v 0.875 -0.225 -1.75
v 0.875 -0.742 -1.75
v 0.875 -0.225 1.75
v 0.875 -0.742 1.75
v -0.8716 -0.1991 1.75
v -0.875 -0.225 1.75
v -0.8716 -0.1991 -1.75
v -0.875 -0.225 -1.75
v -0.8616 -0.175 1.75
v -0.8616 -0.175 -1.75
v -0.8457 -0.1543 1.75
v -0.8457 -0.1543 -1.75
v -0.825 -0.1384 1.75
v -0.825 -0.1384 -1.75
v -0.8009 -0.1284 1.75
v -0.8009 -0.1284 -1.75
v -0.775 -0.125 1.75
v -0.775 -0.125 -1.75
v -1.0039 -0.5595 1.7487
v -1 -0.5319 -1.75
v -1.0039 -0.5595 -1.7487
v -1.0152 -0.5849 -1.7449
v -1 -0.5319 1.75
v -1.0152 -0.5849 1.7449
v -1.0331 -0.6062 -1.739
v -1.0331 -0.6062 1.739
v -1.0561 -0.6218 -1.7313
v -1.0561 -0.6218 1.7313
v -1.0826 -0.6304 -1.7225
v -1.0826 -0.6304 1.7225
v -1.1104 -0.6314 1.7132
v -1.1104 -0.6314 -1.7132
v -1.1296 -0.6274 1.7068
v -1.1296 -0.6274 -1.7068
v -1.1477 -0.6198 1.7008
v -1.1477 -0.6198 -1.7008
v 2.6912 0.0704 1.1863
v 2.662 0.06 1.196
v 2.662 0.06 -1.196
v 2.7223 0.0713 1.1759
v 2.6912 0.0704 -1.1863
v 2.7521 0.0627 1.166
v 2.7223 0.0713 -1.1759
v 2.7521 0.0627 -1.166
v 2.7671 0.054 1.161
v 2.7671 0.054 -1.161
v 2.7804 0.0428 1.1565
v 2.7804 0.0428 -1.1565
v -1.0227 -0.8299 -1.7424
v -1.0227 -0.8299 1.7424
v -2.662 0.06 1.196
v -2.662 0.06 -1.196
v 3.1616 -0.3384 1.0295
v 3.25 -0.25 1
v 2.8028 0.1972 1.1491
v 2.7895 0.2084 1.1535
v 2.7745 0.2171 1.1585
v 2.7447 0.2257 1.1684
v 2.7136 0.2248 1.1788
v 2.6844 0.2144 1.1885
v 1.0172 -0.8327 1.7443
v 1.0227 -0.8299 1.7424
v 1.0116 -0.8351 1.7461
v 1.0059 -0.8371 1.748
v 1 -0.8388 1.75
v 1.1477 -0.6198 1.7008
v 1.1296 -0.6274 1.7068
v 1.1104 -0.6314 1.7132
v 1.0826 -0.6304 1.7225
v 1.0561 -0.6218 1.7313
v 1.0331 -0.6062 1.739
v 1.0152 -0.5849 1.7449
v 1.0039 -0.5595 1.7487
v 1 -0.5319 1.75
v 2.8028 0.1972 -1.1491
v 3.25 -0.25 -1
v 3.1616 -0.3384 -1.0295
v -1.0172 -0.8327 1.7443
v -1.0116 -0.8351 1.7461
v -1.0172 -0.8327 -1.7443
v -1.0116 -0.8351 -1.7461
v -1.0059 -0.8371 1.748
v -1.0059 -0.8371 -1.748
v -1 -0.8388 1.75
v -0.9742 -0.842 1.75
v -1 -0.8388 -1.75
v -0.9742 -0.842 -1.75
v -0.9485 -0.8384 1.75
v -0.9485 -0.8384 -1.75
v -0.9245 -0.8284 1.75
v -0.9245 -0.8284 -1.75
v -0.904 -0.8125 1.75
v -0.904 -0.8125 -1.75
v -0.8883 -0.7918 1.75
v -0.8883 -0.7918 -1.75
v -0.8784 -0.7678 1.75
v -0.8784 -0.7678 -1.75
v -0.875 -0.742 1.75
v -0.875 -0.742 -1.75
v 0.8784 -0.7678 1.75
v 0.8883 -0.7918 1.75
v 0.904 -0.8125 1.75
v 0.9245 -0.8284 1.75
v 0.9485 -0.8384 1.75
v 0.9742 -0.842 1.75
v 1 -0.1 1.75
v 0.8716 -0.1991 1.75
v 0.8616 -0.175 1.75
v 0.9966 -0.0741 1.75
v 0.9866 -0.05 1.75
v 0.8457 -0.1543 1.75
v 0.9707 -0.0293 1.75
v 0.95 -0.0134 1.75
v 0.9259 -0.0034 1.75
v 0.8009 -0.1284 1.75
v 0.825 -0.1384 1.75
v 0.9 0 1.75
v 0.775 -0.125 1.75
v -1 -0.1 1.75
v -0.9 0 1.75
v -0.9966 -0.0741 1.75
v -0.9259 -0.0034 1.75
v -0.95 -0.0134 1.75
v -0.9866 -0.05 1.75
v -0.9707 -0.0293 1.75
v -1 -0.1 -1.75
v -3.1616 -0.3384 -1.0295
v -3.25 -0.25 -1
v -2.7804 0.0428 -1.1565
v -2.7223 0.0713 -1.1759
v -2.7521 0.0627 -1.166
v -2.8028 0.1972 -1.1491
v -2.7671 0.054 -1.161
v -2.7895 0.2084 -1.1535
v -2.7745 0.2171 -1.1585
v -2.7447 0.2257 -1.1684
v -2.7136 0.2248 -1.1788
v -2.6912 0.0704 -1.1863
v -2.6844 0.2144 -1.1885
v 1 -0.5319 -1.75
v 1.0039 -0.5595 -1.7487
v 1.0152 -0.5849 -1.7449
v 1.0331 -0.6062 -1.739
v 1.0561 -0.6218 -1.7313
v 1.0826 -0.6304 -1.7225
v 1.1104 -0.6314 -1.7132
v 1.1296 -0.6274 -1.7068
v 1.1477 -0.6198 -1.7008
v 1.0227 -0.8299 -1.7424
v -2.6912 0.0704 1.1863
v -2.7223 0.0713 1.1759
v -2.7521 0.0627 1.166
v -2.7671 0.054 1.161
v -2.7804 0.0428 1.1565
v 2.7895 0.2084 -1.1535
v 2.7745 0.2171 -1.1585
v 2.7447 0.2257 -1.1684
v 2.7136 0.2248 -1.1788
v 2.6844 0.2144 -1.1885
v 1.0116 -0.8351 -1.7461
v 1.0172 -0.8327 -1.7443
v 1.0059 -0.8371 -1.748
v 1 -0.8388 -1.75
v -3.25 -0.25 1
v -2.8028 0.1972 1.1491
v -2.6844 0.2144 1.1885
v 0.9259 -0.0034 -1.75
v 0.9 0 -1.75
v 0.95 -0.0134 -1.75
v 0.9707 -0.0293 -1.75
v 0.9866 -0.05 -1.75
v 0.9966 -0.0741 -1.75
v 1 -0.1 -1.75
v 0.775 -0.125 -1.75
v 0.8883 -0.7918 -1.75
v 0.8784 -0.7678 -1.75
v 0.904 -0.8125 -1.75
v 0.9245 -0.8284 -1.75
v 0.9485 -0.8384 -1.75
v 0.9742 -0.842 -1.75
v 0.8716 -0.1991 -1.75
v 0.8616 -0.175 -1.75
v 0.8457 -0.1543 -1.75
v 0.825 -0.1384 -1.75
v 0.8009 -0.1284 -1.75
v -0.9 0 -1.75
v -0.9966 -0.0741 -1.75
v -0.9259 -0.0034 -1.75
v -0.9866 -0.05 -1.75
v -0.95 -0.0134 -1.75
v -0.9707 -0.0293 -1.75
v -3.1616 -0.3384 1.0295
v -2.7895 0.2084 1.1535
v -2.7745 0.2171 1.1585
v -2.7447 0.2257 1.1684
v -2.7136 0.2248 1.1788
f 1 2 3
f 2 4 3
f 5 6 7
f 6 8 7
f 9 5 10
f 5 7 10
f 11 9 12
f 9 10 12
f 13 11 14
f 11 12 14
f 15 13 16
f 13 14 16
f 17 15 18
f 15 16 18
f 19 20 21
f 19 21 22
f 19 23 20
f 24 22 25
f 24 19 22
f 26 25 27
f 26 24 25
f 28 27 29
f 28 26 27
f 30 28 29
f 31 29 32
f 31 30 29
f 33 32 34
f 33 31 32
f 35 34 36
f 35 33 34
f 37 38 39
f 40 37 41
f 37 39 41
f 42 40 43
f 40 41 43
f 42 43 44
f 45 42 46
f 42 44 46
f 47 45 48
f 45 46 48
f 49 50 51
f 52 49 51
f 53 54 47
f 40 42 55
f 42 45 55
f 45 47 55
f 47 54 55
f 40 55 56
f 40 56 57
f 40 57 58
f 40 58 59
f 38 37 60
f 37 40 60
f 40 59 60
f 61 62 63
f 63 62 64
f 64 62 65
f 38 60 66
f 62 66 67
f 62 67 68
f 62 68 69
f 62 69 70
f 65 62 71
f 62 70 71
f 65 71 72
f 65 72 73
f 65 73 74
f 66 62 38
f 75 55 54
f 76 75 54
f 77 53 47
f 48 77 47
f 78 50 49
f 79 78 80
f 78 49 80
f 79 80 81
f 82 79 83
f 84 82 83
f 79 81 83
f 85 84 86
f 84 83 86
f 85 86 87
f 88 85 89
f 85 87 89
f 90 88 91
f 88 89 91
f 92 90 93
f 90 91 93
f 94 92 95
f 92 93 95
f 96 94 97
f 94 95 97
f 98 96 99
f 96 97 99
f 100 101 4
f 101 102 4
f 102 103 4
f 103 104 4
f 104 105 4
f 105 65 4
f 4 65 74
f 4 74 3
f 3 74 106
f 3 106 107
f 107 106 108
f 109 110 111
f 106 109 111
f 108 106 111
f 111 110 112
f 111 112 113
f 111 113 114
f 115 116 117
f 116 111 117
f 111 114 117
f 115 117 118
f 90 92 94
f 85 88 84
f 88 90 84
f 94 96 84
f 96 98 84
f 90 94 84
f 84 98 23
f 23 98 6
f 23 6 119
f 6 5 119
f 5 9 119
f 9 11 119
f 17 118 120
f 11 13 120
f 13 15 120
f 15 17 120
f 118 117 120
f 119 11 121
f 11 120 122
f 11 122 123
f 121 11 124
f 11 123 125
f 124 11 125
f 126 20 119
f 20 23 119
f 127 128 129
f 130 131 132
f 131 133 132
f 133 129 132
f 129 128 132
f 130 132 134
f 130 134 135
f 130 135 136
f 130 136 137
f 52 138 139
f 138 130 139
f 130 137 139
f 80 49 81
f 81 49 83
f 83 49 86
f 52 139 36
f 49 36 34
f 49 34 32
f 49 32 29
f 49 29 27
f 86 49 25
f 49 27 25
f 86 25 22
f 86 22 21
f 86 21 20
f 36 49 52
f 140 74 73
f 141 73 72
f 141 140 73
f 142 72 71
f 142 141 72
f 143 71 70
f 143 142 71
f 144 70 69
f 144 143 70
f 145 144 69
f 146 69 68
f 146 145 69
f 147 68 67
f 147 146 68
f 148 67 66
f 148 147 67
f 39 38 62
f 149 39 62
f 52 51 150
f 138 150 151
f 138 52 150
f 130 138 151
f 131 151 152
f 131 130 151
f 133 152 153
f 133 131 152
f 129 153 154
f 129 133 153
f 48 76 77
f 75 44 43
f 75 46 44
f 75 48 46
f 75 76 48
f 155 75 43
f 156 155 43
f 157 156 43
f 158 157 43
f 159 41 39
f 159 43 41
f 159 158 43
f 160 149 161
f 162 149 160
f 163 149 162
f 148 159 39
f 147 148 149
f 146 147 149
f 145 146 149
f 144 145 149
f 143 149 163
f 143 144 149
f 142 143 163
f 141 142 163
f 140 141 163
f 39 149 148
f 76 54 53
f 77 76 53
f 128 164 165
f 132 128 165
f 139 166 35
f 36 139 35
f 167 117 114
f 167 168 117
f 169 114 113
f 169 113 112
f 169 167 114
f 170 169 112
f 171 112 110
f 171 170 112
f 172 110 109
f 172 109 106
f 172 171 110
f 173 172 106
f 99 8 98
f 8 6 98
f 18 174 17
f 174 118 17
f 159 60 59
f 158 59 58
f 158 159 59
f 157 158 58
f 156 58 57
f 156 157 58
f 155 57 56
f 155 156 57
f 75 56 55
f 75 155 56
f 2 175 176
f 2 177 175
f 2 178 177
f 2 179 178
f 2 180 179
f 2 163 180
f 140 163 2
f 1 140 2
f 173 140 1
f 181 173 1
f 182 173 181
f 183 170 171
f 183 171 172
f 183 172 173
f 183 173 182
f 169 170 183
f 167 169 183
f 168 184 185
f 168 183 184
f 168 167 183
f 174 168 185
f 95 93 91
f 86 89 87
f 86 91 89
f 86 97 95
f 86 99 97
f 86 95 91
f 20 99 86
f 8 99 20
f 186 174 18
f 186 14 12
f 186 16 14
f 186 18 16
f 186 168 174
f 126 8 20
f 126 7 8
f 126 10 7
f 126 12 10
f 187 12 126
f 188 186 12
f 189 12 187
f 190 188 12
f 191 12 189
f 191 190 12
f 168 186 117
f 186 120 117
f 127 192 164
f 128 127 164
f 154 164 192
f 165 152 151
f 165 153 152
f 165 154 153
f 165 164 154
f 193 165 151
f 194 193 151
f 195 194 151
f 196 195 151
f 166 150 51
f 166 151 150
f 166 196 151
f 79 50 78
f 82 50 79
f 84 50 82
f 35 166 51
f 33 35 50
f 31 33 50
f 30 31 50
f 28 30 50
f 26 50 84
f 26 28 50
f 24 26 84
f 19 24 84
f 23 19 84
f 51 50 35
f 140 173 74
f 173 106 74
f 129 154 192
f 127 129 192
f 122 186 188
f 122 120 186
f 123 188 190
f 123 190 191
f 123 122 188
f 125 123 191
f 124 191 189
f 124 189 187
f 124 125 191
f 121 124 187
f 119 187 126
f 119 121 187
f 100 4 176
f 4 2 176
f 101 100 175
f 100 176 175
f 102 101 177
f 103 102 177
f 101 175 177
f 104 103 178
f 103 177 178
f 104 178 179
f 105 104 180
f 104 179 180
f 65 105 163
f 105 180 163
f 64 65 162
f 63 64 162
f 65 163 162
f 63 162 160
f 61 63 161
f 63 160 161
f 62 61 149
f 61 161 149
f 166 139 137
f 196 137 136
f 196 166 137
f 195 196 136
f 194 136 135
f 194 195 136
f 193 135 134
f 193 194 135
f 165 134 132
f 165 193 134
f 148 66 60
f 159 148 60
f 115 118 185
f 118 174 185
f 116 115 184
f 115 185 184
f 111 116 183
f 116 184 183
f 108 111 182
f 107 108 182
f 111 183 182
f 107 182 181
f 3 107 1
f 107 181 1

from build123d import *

# Parameters (mm, degrees)
BOSS_EXTRUDE1_DEPTH  = 1.75
CUT_EXTRUDE1_DEPTH   = 4.801744338
MIRROR2_COPY_1_DEPTH = 4.801744338
FILLET1_R            = 0.1


with BuildPart() as part:
    # Sketch1 → Boss-Extrude1 (new, symmetric)
    with BuildSketch(Plane.XY):
        Polygon((-1, 0), (1, 0), (1, -0.7), (2.75, 0.25), (3.25, -0.25), (3.161611652, -0.338388348), (2.727609122, 0.095614182), (0.875, -0.910087913), (0.875, -0.125), (-0.875, -0.125), (-0.875, -0.910087913), (-2.727609122, 0.095614182), (-3.161611652, -0.338388348), (-3.25, -0.25), (-2.75, 0.25), (-1, -0.7), align=None)
    extrude(amount=BOSS_EXTRUDE1_DEPTH, both=True)

    # Sketch2 → Cut-Extrude1 (cut, symmetric)
    with BuildSketch(Plane(origin=(0, 0, 0), x_dir=(1, 0, 0), z_dir=(0, 1, 0))):
        Polygon((-3.25, 1), (-1, 1.75), (-3.25, 1.75), align=None)
    cut_extrude1 = extrude(amount=CUT_EXTRUDE1_DEPTH, both=True, mode=Mode.SUBTRACT)

    # Mirror1: Cut-Extrude1 across plane
    add(cut_extrude1.mirror(Plane.XY), mode=Mode.SUBTRACT)

    # Mirror2: Cut-Extrude1 across plane
    add(cut_extrude1.mirror(Plane(origin=(0, 0, 0), x_dir=(0, 0, 1), z_dir=(1, 0, 0))), mode=Mode.SUBTRACT)

    # Mirror2 copy 1 sketch → Mirror2 copy 1 (cut, symmetric)
    with BuildSketch(Plane(origin=(0, 0, 0), x_dir=(-1, 0, 0), z_dir=(0, 1, 0))):
        Polygon((-3.25, 1), (-1, 1.75), (-3.25, 1.75), align=None)
    extrude(amount=MIRROR2_COPY_1_DEPTH, both=True, mode=Mode.SUBTRACT)

    # Fillet1
    fillet1_edges = [part.edges().sort_by_distance(p)[0] for p in [
        (1, 0, 0),
        (-1, 0, 0),
        (0.875, -0.125, 0),
        (-0.875, -0.125, 0),
        (0.875, -0.910087913, 0),
        (-0.875, -0.910087913, 0),
        (2.727609122, 0.095614182, 0),
        (-2.727609122, 0.095614182, 0),
        (2.75, 0.25, 0),
        (-2.75, 0.25, 0),
        (1, -0.7, 0),
        (-1, -0.7, 0),
    ]]
    fillet(fillet1_edges, radius=FILLET1_R)


solid = part.part
